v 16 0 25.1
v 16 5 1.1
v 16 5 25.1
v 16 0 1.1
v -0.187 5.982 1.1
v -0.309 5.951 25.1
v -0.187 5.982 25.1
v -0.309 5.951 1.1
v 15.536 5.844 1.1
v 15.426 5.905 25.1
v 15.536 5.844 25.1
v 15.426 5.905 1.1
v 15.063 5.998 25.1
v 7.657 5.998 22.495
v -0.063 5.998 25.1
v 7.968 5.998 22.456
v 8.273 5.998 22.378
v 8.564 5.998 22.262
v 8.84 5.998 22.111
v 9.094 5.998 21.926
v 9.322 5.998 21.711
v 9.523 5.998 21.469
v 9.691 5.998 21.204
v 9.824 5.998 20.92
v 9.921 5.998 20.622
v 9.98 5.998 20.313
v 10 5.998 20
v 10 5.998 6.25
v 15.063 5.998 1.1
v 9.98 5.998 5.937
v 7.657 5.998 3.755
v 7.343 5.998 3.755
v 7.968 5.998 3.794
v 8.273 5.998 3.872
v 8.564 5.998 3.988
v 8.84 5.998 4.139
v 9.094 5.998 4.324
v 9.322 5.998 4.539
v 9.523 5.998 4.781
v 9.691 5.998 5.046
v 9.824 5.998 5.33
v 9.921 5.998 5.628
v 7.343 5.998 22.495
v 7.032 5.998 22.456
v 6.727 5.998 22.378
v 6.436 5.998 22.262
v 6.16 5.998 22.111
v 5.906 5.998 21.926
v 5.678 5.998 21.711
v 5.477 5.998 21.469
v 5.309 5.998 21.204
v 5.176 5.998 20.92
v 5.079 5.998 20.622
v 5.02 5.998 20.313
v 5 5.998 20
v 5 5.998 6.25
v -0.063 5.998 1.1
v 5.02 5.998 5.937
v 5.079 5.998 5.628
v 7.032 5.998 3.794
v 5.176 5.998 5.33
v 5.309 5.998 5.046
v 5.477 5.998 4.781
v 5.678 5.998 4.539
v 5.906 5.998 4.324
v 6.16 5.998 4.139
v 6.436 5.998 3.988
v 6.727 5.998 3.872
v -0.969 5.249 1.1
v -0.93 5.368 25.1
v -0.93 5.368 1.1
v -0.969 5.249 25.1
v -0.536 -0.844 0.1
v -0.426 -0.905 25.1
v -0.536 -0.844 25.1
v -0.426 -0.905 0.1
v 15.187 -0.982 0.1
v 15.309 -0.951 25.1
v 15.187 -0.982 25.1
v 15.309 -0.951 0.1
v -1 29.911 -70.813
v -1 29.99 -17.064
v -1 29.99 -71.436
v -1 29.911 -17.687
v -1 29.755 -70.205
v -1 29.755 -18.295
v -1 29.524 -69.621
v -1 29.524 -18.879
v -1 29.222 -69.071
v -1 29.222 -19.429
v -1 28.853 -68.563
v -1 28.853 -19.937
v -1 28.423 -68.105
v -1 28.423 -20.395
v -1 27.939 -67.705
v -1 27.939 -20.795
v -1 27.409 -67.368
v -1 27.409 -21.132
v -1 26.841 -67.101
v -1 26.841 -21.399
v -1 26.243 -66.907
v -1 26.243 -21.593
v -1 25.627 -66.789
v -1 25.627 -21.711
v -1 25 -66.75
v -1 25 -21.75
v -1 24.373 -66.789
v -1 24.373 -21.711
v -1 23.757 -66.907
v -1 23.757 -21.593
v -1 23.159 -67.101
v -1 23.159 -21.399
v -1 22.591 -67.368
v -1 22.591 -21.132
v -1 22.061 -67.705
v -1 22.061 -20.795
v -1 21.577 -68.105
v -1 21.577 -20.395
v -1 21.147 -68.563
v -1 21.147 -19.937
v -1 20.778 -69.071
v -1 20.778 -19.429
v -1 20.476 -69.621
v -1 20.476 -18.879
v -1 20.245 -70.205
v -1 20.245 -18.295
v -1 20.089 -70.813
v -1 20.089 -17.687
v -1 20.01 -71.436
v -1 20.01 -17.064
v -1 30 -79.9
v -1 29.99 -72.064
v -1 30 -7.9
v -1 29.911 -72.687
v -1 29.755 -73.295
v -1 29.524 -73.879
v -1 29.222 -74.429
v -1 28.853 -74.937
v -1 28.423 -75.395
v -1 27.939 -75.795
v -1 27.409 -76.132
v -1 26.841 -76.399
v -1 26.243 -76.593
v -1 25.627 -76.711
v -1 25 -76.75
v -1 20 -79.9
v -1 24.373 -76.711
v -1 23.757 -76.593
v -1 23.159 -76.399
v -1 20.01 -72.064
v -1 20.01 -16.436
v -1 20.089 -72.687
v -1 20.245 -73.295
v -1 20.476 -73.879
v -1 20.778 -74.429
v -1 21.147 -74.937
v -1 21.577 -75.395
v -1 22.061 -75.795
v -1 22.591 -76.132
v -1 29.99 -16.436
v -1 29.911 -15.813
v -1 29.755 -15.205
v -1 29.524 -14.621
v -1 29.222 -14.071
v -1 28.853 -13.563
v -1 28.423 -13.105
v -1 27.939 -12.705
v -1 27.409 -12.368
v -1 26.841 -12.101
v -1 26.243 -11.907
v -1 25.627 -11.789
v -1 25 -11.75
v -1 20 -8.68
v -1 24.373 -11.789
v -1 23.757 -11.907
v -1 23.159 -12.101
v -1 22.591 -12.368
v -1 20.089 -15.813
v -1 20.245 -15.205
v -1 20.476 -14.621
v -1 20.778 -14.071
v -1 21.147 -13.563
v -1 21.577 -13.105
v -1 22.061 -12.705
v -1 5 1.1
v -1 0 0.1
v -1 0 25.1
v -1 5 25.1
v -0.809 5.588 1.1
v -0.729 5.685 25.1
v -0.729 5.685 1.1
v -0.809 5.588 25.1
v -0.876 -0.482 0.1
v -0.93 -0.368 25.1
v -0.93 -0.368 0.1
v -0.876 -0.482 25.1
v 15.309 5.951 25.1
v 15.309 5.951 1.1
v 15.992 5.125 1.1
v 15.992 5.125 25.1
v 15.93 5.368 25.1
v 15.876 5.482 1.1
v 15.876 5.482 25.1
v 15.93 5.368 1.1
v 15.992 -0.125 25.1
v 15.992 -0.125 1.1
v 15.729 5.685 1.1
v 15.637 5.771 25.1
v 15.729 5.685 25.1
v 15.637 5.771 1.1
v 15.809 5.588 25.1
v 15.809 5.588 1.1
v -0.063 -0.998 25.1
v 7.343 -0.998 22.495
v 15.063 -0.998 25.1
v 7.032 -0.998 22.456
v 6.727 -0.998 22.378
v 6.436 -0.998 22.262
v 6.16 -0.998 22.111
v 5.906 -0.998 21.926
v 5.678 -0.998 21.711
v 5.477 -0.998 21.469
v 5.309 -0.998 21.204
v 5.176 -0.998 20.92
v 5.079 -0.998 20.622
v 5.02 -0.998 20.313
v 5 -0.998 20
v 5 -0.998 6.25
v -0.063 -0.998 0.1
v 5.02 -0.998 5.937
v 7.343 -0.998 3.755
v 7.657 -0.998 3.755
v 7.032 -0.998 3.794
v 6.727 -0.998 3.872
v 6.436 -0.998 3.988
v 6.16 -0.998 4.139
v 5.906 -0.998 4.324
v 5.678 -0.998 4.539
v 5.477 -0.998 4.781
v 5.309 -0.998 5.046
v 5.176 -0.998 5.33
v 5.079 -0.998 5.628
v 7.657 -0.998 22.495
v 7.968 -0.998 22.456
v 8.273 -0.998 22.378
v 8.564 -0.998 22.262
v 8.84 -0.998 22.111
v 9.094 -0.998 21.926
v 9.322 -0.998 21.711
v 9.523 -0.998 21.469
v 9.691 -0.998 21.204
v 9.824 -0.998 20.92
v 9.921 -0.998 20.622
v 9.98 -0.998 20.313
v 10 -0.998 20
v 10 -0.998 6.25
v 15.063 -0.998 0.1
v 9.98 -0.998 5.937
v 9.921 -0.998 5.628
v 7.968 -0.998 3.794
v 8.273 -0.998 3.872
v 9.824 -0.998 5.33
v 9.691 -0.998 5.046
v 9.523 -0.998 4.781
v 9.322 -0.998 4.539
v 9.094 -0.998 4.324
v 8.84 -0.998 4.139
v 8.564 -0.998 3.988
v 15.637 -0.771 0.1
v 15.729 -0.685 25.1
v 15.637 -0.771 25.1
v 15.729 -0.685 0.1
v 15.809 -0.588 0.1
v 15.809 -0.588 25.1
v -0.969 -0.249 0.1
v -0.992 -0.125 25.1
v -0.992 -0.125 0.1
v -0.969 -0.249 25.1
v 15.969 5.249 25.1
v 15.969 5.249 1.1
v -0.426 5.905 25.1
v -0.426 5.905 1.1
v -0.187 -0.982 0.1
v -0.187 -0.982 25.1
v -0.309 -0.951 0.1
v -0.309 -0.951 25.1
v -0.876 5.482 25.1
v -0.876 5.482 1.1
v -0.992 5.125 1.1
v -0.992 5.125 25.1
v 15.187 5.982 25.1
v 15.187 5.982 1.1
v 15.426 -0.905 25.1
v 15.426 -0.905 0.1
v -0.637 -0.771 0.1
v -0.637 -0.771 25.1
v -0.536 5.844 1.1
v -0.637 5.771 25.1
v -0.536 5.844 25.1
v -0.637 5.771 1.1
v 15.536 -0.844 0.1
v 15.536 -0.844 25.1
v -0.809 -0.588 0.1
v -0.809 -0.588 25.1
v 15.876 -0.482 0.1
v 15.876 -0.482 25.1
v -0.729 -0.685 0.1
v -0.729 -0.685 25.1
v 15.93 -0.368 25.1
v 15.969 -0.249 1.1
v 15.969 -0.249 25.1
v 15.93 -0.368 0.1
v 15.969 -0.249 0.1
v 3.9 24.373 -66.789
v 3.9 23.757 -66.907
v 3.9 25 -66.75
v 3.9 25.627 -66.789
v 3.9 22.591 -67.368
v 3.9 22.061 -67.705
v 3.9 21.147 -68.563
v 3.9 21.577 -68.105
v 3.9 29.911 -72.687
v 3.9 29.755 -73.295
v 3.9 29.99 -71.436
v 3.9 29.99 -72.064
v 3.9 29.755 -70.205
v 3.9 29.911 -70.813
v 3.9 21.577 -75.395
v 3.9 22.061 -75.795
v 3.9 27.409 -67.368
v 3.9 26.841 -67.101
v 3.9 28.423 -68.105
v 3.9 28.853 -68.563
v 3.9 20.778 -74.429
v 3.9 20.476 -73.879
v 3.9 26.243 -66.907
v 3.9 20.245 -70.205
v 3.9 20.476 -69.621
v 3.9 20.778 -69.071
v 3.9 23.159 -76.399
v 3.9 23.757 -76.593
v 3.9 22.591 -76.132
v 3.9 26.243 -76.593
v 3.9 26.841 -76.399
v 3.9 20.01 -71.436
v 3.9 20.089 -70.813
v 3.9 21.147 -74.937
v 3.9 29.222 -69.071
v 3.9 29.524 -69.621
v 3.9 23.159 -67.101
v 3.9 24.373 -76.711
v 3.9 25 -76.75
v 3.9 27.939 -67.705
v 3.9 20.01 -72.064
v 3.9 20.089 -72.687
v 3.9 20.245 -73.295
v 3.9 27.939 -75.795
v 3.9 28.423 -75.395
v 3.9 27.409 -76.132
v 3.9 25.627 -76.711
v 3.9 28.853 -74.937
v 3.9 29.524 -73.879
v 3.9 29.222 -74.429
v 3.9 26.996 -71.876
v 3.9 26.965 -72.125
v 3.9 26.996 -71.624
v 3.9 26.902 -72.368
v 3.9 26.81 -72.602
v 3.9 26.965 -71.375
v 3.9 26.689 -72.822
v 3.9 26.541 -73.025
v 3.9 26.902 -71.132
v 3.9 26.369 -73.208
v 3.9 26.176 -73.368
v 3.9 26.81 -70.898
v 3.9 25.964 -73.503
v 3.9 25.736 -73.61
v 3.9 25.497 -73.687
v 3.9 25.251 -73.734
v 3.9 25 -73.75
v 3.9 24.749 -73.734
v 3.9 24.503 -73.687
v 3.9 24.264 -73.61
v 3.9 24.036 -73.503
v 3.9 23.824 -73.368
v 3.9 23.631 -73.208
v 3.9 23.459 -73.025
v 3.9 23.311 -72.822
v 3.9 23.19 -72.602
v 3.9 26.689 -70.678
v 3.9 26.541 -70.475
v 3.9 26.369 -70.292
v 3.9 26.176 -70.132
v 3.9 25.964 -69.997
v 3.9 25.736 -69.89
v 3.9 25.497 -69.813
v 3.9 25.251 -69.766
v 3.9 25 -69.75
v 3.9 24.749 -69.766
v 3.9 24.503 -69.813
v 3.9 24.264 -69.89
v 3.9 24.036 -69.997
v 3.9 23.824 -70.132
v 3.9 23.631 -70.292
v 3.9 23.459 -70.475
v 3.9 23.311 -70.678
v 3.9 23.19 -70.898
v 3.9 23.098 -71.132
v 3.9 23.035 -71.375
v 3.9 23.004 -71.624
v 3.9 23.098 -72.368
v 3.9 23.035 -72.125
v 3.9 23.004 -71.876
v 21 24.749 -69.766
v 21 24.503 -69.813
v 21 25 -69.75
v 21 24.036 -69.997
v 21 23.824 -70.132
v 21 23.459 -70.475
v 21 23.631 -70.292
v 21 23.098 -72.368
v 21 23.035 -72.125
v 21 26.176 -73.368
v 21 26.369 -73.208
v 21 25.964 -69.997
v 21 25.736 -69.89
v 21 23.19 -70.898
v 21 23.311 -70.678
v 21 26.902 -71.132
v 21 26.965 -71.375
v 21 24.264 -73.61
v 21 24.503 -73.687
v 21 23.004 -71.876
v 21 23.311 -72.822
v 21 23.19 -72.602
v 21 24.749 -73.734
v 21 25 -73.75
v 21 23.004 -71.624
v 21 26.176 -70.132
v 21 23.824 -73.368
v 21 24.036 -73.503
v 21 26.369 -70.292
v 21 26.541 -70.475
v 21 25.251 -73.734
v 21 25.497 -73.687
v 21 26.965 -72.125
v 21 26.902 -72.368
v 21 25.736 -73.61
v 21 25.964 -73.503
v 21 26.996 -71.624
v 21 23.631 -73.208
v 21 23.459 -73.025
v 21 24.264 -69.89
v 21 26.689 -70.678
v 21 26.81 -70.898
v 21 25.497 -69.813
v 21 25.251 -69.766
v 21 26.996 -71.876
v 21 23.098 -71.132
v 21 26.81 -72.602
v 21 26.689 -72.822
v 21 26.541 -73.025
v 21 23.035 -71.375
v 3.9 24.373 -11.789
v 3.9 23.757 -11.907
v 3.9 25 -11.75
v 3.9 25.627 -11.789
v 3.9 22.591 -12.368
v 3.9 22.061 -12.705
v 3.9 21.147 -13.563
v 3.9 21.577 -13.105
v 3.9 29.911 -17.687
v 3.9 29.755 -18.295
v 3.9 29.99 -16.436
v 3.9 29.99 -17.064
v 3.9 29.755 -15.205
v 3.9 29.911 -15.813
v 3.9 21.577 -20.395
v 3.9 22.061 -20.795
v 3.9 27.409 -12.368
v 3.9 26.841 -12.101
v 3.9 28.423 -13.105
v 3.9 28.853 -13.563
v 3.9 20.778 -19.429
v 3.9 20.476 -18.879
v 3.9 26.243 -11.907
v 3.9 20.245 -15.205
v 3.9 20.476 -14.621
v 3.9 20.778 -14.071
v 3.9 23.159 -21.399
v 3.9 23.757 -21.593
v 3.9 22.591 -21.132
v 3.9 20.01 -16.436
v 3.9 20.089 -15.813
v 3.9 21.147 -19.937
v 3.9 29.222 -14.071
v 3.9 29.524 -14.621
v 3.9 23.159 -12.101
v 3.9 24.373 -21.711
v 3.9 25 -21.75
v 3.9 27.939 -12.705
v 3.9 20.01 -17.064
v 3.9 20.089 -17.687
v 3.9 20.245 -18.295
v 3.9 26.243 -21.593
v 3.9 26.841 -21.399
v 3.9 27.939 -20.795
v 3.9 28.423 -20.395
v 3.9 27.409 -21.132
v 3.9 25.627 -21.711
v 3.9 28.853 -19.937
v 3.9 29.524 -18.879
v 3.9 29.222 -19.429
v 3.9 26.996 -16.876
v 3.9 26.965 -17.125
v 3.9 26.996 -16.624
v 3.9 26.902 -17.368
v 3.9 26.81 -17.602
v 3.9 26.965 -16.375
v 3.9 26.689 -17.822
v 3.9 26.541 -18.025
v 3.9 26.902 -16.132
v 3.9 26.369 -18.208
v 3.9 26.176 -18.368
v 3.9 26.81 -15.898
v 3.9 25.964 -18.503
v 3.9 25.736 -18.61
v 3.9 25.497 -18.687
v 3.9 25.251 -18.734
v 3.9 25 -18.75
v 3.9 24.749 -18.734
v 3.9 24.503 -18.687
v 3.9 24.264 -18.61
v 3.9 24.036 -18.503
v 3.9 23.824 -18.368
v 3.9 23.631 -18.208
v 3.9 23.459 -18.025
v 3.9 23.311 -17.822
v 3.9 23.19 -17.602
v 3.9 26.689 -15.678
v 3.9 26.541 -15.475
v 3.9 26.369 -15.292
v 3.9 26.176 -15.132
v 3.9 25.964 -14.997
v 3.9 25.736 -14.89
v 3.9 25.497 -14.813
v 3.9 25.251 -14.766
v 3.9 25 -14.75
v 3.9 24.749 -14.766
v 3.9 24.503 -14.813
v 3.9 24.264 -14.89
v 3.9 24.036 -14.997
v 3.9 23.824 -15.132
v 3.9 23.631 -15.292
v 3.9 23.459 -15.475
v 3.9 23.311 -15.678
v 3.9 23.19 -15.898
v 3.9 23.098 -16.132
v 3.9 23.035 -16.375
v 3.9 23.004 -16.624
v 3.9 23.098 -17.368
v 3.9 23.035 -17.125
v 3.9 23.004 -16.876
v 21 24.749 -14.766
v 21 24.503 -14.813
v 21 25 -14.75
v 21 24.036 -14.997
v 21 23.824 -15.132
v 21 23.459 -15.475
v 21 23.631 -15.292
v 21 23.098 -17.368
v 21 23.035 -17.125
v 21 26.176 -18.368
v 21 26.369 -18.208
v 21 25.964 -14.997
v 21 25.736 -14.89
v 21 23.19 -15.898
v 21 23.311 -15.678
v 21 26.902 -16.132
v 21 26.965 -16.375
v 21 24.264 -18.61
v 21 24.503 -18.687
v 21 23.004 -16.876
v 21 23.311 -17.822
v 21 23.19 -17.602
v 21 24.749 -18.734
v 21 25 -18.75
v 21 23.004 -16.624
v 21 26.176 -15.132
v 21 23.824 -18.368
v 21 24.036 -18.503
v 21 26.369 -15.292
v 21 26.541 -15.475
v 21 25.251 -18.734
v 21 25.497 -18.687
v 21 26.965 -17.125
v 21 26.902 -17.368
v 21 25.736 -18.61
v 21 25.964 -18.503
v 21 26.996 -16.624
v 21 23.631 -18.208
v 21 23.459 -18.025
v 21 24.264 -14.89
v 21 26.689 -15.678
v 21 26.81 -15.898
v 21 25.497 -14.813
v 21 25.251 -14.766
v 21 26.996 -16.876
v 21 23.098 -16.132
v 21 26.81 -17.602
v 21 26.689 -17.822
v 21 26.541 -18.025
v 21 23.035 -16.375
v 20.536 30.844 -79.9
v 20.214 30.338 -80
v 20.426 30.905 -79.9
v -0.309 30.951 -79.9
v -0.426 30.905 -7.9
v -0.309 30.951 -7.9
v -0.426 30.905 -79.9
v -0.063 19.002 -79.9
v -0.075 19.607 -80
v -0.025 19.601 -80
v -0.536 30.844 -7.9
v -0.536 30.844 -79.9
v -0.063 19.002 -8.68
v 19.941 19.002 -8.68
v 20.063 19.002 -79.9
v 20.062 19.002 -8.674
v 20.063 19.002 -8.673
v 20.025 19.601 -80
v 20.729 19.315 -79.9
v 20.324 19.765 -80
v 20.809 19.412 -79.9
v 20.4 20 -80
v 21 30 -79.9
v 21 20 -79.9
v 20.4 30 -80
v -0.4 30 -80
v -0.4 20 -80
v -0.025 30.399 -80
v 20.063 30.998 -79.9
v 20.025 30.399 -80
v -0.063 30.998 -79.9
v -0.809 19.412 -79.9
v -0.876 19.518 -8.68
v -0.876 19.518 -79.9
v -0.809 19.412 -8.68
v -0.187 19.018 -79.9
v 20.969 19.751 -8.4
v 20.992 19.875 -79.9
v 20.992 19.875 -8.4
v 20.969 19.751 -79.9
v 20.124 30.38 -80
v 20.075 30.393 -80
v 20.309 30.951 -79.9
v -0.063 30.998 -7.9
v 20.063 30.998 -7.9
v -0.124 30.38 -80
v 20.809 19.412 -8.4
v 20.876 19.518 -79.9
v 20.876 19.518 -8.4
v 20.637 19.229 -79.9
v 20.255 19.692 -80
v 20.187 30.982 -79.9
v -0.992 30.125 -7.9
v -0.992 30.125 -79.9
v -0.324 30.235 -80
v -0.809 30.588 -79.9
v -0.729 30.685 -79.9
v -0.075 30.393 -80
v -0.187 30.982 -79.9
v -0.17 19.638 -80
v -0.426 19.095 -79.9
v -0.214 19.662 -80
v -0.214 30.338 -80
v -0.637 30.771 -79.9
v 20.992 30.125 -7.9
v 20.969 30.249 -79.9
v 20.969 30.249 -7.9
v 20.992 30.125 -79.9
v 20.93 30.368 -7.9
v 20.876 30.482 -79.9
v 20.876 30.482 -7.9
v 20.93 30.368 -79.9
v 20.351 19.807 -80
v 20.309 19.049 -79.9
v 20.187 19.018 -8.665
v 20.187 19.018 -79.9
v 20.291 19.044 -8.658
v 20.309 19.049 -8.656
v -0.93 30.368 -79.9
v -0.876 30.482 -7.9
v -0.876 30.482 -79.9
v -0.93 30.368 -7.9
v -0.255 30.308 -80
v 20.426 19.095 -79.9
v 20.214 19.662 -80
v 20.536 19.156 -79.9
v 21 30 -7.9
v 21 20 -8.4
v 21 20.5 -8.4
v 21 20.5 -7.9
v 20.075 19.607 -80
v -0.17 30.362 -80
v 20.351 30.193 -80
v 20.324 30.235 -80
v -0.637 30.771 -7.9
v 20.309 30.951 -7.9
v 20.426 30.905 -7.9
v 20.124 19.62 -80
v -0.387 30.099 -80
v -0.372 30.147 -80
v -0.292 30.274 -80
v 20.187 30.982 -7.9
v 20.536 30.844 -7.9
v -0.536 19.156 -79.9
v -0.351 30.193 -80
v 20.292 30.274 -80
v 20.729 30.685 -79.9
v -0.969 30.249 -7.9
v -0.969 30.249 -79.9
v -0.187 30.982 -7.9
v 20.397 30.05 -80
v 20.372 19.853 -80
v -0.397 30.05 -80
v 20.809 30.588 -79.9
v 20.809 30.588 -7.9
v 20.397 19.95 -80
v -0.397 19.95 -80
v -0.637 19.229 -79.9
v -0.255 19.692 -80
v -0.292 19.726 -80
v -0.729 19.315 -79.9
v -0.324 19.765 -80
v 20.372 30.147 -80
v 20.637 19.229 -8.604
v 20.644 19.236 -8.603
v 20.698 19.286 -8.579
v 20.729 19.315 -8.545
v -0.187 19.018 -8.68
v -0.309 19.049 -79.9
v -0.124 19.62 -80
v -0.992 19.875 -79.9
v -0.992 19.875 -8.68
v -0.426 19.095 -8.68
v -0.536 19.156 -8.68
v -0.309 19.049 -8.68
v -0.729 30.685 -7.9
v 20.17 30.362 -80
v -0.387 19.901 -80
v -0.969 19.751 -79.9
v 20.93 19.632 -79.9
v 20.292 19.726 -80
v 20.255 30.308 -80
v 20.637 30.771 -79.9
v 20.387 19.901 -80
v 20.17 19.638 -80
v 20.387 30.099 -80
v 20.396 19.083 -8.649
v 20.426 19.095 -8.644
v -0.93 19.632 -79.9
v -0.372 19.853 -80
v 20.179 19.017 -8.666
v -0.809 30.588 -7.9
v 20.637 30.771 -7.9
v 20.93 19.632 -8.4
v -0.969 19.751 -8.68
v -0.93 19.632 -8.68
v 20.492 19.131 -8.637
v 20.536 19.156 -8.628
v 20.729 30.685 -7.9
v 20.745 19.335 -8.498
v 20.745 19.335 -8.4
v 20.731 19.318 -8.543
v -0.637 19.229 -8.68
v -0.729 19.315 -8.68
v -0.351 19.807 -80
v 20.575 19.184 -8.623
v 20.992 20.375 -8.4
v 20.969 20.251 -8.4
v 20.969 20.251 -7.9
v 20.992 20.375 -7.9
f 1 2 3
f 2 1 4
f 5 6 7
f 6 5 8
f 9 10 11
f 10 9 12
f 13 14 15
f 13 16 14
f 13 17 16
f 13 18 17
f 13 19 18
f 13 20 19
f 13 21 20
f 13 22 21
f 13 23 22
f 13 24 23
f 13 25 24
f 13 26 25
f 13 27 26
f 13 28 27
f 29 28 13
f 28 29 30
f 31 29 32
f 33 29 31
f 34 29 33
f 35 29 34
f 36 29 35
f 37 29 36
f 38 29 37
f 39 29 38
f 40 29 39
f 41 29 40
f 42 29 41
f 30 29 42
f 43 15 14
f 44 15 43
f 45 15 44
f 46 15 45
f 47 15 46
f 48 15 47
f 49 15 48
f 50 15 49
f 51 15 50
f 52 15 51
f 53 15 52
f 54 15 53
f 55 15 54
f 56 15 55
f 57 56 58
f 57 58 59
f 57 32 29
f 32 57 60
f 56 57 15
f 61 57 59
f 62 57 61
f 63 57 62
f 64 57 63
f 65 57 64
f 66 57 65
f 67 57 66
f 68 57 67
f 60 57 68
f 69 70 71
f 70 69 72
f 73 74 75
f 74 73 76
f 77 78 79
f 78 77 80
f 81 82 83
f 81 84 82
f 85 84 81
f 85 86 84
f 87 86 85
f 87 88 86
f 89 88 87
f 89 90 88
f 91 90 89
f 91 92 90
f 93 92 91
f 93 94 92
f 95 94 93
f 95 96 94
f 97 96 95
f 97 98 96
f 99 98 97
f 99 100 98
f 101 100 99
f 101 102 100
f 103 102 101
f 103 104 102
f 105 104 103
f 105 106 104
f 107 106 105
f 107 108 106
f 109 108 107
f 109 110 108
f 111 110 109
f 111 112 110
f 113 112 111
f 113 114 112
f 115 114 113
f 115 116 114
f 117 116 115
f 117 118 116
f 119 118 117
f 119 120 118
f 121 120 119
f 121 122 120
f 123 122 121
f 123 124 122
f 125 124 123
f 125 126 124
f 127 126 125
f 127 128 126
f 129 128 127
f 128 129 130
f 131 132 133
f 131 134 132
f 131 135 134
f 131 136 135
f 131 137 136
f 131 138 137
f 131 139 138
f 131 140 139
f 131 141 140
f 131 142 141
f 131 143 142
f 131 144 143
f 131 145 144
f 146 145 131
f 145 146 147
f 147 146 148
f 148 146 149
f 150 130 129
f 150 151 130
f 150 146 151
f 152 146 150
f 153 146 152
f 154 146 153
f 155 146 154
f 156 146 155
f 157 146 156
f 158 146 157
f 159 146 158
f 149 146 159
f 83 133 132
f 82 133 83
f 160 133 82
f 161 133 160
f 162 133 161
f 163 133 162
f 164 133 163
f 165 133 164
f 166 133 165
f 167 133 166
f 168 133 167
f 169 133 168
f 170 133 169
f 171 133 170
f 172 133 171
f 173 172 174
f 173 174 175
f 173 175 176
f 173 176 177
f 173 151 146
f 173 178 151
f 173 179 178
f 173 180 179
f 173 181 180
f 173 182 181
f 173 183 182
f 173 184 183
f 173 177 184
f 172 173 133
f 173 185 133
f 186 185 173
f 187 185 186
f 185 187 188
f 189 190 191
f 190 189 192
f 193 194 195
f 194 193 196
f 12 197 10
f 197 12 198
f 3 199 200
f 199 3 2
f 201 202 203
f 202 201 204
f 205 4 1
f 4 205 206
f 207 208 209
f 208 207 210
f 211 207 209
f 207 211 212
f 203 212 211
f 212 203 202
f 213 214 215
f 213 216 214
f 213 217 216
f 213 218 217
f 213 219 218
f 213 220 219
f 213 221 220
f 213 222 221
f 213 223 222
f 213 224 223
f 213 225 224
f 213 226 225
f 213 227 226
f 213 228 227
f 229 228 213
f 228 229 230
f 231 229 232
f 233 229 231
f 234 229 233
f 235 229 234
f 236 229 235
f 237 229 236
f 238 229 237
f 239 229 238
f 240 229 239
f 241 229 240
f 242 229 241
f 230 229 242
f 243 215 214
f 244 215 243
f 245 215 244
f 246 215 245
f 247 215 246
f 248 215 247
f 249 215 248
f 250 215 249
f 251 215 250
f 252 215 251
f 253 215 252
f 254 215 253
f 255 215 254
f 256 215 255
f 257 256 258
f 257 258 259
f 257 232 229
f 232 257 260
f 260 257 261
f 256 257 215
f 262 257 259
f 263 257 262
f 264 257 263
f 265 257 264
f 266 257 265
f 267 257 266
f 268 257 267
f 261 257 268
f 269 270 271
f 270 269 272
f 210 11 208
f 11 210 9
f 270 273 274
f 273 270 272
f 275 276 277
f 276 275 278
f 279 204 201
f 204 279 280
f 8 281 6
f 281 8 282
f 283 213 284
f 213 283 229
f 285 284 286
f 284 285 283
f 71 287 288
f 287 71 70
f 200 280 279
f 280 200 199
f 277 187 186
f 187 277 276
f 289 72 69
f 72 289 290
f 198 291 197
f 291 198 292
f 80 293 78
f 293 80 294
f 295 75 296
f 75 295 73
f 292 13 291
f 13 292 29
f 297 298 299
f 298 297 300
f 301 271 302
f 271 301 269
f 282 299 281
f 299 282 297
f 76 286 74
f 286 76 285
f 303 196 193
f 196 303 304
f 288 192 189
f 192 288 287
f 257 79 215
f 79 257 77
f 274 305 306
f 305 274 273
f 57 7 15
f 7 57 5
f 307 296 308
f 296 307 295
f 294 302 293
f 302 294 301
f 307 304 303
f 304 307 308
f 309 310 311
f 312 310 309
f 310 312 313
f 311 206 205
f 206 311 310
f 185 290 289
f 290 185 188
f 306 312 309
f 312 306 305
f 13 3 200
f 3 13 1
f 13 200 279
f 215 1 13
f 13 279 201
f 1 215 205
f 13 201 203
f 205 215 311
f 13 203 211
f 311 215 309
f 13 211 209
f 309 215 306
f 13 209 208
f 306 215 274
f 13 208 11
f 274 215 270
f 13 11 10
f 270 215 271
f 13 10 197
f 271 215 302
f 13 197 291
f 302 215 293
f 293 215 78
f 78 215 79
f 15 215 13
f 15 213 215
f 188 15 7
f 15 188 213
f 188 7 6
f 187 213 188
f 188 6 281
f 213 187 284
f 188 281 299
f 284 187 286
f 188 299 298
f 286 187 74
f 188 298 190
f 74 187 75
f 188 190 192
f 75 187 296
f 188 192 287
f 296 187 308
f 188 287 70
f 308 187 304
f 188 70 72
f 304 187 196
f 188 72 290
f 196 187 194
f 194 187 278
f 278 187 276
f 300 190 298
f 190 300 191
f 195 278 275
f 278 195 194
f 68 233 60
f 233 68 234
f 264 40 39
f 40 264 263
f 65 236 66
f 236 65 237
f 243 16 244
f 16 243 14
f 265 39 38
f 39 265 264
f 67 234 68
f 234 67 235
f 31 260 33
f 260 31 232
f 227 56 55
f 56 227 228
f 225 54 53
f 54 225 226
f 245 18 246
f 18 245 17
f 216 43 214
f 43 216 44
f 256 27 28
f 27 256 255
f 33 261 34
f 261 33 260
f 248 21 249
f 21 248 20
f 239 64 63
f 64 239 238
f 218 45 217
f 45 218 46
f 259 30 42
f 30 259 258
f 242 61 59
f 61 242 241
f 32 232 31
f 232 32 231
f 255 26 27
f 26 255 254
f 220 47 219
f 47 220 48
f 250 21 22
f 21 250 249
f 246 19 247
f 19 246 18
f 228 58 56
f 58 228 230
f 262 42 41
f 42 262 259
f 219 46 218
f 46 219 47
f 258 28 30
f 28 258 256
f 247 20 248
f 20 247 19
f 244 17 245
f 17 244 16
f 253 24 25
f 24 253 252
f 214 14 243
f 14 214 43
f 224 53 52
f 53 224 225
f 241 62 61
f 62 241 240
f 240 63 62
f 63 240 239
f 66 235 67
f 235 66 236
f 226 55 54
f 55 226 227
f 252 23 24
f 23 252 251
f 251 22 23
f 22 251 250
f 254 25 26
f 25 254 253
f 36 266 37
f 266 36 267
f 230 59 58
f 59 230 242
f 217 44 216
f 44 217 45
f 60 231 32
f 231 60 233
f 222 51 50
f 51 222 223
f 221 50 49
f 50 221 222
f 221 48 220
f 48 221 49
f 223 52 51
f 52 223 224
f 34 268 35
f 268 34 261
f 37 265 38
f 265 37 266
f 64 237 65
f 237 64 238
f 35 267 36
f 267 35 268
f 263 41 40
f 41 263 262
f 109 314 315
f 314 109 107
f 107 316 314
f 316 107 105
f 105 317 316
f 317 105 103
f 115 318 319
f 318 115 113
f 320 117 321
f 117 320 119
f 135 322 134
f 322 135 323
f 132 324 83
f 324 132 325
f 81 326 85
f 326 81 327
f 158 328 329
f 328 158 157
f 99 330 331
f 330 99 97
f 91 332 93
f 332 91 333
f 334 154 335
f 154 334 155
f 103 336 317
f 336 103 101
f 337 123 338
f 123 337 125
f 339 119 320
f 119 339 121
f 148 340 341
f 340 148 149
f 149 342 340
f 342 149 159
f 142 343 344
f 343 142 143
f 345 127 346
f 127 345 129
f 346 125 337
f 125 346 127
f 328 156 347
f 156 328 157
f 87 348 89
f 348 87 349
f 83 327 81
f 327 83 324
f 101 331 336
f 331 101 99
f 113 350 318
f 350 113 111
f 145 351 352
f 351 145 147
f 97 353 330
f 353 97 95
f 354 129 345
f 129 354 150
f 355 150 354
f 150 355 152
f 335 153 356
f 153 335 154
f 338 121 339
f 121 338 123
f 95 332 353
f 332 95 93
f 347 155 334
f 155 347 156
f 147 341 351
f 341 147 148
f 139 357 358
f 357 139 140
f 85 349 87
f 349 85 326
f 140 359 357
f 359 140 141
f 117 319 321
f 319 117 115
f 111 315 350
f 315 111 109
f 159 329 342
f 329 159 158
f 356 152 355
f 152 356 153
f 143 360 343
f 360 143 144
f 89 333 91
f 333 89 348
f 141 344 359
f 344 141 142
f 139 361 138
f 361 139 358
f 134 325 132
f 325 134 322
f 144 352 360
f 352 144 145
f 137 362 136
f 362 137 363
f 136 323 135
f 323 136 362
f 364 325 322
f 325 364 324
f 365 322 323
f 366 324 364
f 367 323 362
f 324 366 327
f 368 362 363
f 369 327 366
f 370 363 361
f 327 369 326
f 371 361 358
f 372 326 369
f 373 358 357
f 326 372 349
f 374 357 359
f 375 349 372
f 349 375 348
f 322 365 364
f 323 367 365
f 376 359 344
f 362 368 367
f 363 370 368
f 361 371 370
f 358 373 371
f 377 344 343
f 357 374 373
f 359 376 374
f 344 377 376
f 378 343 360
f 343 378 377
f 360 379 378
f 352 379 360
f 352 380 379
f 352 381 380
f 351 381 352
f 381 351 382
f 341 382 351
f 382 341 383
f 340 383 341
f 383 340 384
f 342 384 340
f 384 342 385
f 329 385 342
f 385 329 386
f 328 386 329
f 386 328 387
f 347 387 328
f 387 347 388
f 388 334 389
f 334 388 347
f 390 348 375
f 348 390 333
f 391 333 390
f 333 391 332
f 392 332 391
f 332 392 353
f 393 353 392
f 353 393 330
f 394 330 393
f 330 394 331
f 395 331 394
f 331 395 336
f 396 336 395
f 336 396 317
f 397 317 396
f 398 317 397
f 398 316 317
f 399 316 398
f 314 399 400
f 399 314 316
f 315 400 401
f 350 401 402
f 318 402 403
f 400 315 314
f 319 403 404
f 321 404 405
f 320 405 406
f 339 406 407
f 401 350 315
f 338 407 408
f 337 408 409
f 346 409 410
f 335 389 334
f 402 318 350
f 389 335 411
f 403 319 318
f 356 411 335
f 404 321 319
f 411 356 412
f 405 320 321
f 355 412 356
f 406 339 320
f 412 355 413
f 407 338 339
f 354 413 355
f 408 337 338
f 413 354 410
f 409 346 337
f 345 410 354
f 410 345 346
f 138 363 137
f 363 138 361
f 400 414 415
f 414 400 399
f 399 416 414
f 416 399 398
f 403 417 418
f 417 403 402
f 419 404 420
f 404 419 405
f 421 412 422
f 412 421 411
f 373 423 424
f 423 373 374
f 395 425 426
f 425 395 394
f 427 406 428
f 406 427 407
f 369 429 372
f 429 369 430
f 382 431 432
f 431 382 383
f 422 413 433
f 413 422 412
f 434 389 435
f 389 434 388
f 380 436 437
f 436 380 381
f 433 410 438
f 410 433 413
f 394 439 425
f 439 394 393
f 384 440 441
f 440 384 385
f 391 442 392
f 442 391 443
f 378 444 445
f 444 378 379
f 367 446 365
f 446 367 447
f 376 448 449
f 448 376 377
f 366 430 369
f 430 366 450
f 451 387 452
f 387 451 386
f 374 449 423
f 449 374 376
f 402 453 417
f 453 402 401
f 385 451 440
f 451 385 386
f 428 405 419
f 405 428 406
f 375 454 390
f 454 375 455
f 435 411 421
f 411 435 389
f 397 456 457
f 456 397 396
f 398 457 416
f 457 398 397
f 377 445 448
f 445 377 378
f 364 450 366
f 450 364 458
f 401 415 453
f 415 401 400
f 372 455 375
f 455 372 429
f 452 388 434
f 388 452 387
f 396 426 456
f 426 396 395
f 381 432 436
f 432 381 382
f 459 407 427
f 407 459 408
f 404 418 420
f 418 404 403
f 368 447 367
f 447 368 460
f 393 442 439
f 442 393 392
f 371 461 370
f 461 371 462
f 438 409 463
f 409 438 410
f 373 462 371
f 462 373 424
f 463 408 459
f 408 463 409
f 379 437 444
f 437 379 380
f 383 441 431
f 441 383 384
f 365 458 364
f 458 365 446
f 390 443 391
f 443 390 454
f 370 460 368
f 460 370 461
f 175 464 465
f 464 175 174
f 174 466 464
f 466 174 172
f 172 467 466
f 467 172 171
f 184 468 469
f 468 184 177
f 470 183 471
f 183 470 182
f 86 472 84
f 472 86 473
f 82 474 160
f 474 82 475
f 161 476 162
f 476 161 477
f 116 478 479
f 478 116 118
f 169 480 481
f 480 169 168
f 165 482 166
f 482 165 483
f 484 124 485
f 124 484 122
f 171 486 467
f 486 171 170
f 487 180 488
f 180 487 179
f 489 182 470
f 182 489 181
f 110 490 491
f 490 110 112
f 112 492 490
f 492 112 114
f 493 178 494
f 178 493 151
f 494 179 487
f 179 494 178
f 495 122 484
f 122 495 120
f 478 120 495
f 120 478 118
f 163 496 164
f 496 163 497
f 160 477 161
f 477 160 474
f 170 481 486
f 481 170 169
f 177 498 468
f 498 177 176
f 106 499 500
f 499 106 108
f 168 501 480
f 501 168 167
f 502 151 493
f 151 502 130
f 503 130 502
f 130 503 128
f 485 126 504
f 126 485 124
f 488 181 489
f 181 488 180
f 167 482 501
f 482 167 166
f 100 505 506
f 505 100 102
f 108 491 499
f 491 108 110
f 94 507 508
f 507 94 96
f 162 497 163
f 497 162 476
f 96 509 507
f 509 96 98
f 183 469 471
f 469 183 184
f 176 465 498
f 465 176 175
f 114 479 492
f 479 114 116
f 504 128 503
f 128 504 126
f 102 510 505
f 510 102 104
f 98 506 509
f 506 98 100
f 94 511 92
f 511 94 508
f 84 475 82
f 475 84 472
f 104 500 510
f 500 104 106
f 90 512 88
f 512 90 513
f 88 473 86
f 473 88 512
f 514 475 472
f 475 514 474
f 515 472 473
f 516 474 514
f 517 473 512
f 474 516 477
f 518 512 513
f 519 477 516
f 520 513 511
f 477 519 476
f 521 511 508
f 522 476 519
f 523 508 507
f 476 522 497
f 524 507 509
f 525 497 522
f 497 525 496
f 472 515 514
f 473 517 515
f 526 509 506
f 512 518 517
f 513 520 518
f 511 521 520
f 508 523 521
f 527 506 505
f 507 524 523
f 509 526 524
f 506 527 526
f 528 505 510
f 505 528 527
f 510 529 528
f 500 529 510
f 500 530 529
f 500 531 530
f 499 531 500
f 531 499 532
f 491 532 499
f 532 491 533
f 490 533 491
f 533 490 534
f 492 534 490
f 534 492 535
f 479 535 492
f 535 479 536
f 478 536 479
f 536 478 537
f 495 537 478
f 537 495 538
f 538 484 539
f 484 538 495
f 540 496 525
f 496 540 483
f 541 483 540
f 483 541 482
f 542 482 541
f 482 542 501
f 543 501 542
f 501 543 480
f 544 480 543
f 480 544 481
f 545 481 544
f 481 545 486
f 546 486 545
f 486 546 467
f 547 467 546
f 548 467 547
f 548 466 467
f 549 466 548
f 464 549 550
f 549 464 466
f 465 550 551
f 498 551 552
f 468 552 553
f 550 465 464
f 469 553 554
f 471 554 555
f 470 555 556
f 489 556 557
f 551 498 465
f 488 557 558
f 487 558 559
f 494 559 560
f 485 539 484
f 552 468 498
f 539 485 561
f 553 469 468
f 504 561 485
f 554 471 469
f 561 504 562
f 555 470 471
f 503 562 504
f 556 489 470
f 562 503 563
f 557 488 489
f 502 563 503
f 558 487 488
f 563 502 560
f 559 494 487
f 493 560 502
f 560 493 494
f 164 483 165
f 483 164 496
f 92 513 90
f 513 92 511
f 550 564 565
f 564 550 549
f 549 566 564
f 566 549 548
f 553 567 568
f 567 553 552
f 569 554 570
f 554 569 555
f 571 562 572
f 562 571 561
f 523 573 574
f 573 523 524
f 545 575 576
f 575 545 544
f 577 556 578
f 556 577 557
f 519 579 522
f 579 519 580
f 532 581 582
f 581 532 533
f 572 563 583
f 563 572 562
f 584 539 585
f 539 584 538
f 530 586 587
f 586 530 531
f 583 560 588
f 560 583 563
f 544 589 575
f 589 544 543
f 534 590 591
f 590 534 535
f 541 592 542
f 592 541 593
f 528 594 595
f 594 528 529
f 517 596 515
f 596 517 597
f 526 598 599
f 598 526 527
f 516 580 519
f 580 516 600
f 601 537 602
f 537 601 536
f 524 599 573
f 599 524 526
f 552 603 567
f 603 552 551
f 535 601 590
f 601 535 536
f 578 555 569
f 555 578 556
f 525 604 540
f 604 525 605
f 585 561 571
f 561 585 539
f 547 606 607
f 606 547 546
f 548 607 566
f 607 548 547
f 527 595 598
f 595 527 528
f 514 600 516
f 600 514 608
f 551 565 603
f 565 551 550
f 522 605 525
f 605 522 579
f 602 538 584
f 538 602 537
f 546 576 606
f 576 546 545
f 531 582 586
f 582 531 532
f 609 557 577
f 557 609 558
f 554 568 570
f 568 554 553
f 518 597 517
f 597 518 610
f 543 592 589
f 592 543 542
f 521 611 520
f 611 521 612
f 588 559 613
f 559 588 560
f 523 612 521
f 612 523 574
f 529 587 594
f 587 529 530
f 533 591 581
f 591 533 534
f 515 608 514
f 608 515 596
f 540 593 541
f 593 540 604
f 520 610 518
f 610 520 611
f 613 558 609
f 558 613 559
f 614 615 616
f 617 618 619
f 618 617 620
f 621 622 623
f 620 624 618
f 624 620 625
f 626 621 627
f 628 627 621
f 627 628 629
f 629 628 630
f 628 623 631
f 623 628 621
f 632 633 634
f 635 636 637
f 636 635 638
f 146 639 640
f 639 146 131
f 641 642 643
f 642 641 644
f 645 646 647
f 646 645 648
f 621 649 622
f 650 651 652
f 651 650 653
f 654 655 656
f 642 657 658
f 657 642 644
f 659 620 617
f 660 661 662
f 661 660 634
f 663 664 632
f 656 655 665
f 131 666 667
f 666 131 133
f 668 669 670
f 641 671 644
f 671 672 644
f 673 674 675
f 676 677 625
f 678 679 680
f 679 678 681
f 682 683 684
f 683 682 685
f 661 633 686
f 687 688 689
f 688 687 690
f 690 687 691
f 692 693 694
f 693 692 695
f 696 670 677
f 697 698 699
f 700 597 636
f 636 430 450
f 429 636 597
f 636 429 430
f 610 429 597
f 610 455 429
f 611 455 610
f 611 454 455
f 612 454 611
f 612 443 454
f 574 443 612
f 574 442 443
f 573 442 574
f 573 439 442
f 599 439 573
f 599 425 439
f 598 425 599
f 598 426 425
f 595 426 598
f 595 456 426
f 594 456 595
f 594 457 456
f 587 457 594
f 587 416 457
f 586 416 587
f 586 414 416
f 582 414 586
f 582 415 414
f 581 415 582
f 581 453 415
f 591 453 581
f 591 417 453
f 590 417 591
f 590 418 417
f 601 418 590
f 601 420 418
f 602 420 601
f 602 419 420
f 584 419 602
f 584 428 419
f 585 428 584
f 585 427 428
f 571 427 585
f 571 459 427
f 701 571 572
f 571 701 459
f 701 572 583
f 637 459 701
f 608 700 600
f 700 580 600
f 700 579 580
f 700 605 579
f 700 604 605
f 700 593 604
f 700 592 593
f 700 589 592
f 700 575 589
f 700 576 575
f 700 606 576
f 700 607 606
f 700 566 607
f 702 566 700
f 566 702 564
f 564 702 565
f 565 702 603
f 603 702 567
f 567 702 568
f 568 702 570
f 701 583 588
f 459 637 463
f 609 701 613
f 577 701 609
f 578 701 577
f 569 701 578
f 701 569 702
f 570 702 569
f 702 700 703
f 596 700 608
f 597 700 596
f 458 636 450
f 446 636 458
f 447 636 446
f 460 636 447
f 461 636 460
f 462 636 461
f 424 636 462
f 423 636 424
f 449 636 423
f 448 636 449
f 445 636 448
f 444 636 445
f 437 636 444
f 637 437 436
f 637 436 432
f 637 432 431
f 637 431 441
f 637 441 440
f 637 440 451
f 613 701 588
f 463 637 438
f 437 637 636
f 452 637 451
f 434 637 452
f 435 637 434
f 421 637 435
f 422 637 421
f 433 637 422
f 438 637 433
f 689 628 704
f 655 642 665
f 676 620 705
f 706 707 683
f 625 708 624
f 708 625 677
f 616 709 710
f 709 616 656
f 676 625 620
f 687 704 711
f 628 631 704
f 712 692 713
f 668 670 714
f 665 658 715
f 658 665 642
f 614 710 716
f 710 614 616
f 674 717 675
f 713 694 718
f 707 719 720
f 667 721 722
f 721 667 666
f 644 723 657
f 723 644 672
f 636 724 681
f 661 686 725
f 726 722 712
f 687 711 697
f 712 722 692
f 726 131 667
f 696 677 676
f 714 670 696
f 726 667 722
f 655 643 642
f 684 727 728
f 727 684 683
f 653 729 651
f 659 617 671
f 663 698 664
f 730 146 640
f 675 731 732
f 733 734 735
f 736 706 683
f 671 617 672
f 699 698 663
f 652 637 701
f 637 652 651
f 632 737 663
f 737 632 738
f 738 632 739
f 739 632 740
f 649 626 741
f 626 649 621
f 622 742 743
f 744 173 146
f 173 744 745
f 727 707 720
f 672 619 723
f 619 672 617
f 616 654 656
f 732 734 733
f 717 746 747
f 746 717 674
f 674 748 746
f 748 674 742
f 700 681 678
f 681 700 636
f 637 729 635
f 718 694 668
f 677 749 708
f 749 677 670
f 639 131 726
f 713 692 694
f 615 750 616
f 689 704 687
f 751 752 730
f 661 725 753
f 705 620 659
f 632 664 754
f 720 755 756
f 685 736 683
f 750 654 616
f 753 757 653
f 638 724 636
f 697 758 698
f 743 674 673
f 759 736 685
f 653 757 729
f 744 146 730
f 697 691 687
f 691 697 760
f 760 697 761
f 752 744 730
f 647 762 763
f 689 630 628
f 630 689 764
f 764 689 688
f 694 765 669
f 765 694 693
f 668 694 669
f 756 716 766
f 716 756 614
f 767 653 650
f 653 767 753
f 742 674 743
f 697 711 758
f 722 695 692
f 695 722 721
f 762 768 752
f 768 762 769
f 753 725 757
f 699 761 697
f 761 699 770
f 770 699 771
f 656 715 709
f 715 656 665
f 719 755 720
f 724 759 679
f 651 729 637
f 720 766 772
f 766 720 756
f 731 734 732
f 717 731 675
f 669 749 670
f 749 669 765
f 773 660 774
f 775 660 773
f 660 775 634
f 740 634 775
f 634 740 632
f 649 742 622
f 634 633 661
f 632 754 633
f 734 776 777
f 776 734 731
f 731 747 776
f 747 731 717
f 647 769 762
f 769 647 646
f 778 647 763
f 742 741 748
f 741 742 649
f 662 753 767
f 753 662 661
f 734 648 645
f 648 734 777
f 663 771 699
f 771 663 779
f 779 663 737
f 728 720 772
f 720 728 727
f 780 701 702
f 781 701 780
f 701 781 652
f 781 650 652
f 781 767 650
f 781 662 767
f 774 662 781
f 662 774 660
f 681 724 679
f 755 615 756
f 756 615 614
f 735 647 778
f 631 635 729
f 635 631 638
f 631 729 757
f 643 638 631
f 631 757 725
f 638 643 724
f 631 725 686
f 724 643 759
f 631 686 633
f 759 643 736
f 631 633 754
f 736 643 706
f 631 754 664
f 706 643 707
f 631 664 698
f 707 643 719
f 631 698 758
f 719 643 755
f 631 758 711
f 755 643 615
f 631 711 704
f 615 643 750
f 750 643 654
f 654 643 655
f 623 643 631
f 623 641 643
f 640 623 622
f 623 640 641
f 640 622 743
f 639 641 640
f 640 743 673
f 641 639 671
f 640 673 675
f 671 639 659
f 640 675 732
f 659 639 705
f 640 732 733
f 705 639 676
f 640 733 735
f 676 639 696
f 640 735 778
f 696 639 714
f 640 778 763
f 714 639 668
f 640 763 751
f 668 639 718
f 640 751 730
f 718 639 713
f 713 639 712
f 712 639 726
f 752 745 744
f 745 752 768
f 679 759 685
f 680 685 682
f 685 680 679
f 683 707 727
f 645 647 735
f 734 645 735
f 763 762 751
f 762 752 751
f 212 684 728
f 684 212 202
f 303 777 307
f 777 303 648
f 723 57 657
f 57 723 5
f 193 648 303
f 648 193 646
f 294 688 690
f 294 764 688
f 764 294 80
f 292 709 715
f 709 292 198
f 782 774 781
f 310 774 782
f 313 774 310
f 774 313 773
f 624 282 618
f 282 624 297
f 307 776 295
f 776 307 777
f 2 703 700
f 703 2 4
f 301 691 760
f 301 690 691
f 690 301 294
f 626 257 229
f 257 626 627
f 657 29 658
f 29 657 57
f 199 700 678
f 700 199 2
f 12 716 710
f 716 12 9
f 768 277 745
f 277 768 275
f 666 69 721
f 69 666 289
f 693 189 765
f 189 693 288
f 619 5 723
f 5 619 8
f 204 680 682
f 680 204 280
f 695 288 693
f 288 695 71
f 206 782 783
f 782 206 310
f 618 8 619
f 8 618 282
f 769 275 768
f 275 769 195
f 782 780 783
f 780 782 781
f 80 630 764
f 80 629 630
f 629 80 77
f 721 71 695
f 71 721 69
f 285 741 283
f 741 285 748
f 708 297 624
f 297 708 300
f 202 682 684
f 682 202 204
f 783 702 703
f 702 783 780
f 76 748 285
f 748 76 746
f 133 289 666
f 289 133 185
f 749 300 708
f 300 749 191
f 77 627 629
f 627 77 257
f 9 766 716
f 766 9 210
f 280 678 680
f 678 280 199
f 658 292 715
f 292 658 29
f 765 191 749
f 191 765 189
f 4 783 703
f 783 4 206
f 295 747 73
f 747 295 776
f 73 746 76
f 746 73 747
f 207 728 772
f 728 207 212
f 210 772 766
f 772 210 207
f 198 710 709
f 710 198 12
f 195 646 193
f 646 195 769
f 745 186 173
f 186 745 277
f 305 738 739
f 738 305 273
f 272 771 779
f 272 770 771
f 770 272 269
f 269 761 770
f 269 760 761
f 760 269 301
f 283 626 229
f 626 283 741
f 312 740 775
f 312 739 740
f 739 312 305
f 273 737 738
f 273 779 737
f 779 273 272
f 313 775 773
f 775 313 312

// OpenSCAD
// file: util.scad
module rounded_cube(c=[1,1,1], r=0.1, h=0.4) {
    minkowski(){
      cube(c);
      cylinder(r,h);
    }
}

module half_cylinder(h=1, r=1) {
 intersection() {
     translate([0, -r, 0]) cube([r*2,r*2,h]);
     cylinder(r=r, h=h);
 }   
}

module halfSphere(r=1) {
 intersection() {
     translate([0, -r, -r]) cube([r*2,r*2,r*2]);
     sphere(r=r);
 }   
}

module pin(h=1) {
    hull(){
        cylinder(h=0.1,r=h/2);
        translate([0,0,h]) sphere(r=0.1);
    }
}

module hollow_cylinder(h=1, r=1, shell=0.1) {
    s = 1 - shell;
    difference() {
        cylinder(h=h,r=r);
        translate([0,0,-0.5]) cylinder(h=h+1,r=r*s);
    }
}

module cube_minus_sphere(size=1) {
    difference() {
       translate([-size/2,0.1,-size/2]) cube([size,size/2,size]);
       rotate([0,0,90]) halfSphere(r=size/2);
    }
}

module curve_cube(c=[1,1,1], curve=0.5) {
    difference() {
        rounded_cube(c);
        scale([1, 1, curve]) 
            translate([-1.5,c[1]/2,-c[1]/8]) 
                rotate([0,90,0]) 
                    cylinder(h=c[0]+3,r=c[1]/1.8);
    }    
}
module hook(h=5, d=3) {
    $fn=100;
    cylinder(h,d=d);
    translate([0,0,h]) sphere(d=d);
    
}

module cone(startDia=5, endDia=1, h=5) {
    $fn=200;
    hull() {
        cylinder(h=0.1, d=startDia);
        translate([0,0,endDia]) cylinder(h, d=endDia);
    }
}


module flexScrewHole(screwLength=10, screwDia=5, stretch=10, center=true ) {
    centerX = center ? -stretch/2 : 0;
    translate([centerX,0,0]){
        hull() {
            cylinder(h=screwLength, d=screwDia);
            translate([stretch,0,0]) cylinder(h=screwLength, d=screwDia);
        }
    }
}

module nut() {
    $fn=6;
    cylinder(d=TC_SCREW_NUT_DIA, h=TC_SCREW_NUT_HEIGHT);   
}

module hollow_rounded_cube(c=[1,1,1], shell=2.5, center=true) {
    //center
    centerX = center ? -c[0]/2 : 0;
    centerY = center ? -c[1]/2 : 0;
    translate([centerX,centerY, 0]) {
    
    difference() { 
        rounded_cube(c,0.1, 0.4);
        //inner
        translate([shell/2,shell/2,-.1]) {
            rounded_cube([c[0]-shell,c[1]-shell,c[2]+1],0.1, 0.4);
        }
    }
}
}

module triangle(size=100, height=10) {
 linear_extrude(height=height) polygon(points=[[0,0],[size,0],[0,size]], paths=[[0,1,2]]);
}
// file: startup.scad
include <util.scad>;

$fn =50;

//Aluminuim profile 3030
ALUMINUM_SIZE=30;

// carraige mount
CARRAGE_MOUNT_X=35;
CARRAGE_MOUNT_Y=65;
CARRAGE_MOUNT_Z=7;
TOOL_CHANGER_Z=7;

//size
CMS =
[CARRAGE_MOUNT_X,
CARRAGE_MOUNT_Y,
CARRAGE_MOUNT_Z];

// tool changer
toolChangerSize = 
[CARRAGE_MOUNT_X,
CARRAGE_MOUNT_Y,
TOOL_CHANGER_Z];

// tool catcher
TC_BASE_X=ALUMINUM_SIZE;
TC_BASE_Y=5;
TC_BASE_Z=20;
TC_BASE=[TC_BASE_X,TC_BASE_Y,TC_BASE_Z];


//locking in location small rods
RODS_HEIGHT=9;   // real heigt is 12
RODS_DIA=3.5;
RODS_FROM_X_FRONT=6;
RODS_FROM_Y_FRONT=20;
RODS_DISTANCE_FRONT=24;

// HOOKS
HOOKS_HEIGT=6;
HOOKS_DIA=6;

//magnets
MAGNET_DIA=12.5;
MAGNET_HEIGHT=5.5;
MAGNET_DISTANCE=30;

//new magnets
MAGNET_NEW_DIA=20;
MAGNET_NEW_HEIGHT=6;

//Brass Knurl screw
BRASS_KNURL_SCREW_DIA=5;
BRASS_KNURL_SCREW_HEIGHT=5;

//V6 HOT END
v6_DIA=16;
v6_DIA_HEIGHT_DOWN=3;
v6_DIA_HEIGHT_UP=3.7;
v6_INNER_DIA=12;
v6_INNER_HEIGHT=6;

v6_MOUNT_HEIGHT=v6_DIA_HEIGHT_DOWN + v6_INNER_HEIGHT + v6_DIA_HEIGHT_UP - .2;
v6_MOUNT_WIDTH=20;

v6_SECOND_PART_WIDTH=11;

//tool change
TC_SCREW_DISTANCE = 55;
TC_SCREW_LENGTH = 25;
TC_SCREW_HEAD_HEIGHT = 5;
TC_SCREW_HEAD_DIA = 10;
TC_SCREW_DIA = 4;

//nut 
TC_SCREW_NUT_DIA = 8;
TC_SCREW_NUT_HEIGHT = 4;


//tool catcher
TOOL_CATHCER_SCREWS_DISTANCE = ALUMINUM_SIZE/2;

//plastic tie 
PLASTIC_TIE_HEIGHT = 2.2;
PLASTIC_TIE_DEPTH = 3;

//fan mount
FAN_MOUNT_DISTANCE=20;
FAN_MOUNT_TUBE_DIA=5;


module toolChangeScrew() {
//top
cylinder (h=TC_SCREW_HEAD_HEIGHT, d=TC_SCREW_HEAD_DIA);
//body
translate([0,0,TC_SCREW_HEAD_HEIGHT -.1])
cylinder (h=TC_SCREW_LENGTH, d=TC_SCREW_DIA);    
}

module toolChangeScrews(right=true, center=true) {
    r = right ? 180 : 0;
    c = center ? -TC_SCREW_DISTANCE/2 : 0;
    translate([c,0,0]) {
        rotate([r,0,0]) {
            toolChangeScrew();
            translate([TC_SCREW_DISTANCE,0,0])
                toolChangeScrew();
        }
  }
}

module toolChangeScrewsWithNut(right=true, center=true) {
    toolChangeScrews(right, center);
    c = center ? -TC_SCREW_DISTANCE/2 : 0;
    r = right ? -TC_SCREW_LENGTH : TC_SCREW_LENGTH;
    translate([c,0,0]) {
      translate([0,0, r]) nut();
      translate([TC_SCREW_DISTANCE,0,r]) nut();
    }
    
    
}

module M3Screw(length=10) {
    //top
    cylinder (h=3, d=5.5);
    //body
    translate([0,0,3 -.1])
    cylinder (h=length, d=3);
}

module M5Screw(length=10) {
    //top
    cylinder (h=5, d=9);
    //body
    translate([0,0,5 -.1])
    cylinder (h=length, d=5);
}

module brassKnurlScrew() {
    cylinder (h=BRASS_KNURL_SCREW_HEIGHT, d=BRASS_KNURL_SCREW_DIA);
}


module magnet(h=MAGNET_HEIGHT, d=MAGNET_DIA) {
    cylinder (h=MAGNET_HEIGHT, d=MAGNET_DIA);
}

module small_rods_relative(distanceBetweenRodsX=10, distanceBetweenRodsY=10 ,centerRode=true) {
    //up right
    cylinder(h=RODS_HEIGHT, d=RODS_DIA);
    //up left
    translate([distanceBetweenRodsX,0,0])
      cylinder(h=RODS_HEIGHT, d=RODS_DIA);
    //down right
    translate([0,distanceBetweenRodsY,0])
      cylinder(h=RODS_HEIGHT, d=RODS_DIA);
    //down left
    translate([distanceBetweenRodsX,distanceBetweenRodsY,0])
      cylinder(h=RODS_HEIGHT, d=RODS_DIA);
    if(centerRode){
    //center
    translate([distanceBetweenRodsX/2,distanceBetweenRodsY/2,0])
      cylinder(h=RODS_HEIGHT, d=RODS_DIA);
    }
}

module small_hooks_relative(distanceBetweenHooksX=10, distanceBetweenHooksY=10, hooksScale=1) {
    //up right
    scale(hooksScale) hook(h=HOOKS_HEIGT, d=HOOKS_DIA);
    //up left
    translate([distanceBetweenHooksX,0,0])
      scale(hooksScale) hook(h=HOOKS_HEIGT, d=HOOKS_DIA);
    //down right
    translate([0,distanceBetweenHooksY,0])
      scale(hooksScale) hook(h=HOOKS_HEIGT, d=HOOKS_DIA);
    //down left
    translate([distanceBetweenHooksX,distanceBetweenHooksY,0])
      scale(hooksScale) hook(h=HOOKS_HEIGT, d=HOOKS_DIA);
}

module magnetsRelative(distanceBetweenMagnet=15, center=true) {
    
    c = center ? 0 : -distanceBetweenMagnet/2 ;
    translate([c, 0,0 ]){
    
      //up center
      translate ([distanceBetweenMagnet/2, 0,0]) magnet();    
      //translate ([distanceBetweenMagnetX, distanceBetweenMagnetY,0])
       // magnet();
      translate ([-distanceBetweenMagnet/2, 0,0])
        magnet();
    }
}


module tieHole(tieSize=3, depth=10) {
   rotate_extrude(angle=180, $fn=100)
       translate([depth, 0]) circle(tieSize);   
}

module M3nut() {
    $fn=6;
    cylinder(d=6, h=3);
}

module newMagnet() {
    $fn=400;
    cylinder(h=MAGNET_NEW_HEIGHT, d=MAGNET_NEW_DIA);
}

module toolChangerScrewGate() {
    cone(TC_SCREW_DIA+1.5, TC_SCREW_DIA, 2);
}
// main file
include <startup.scad>;
include <util.scad>;

X = TC_SCREW_HEAD_DIA*2;
Y = TC_SCREW_HEAD_HEIGHT*2;
Z = TC_SCREW_DISTANCE*1.3;


TC_BASE2_X = 15;
TC_BASE2_Y = 5;
TC_BASE2_Z = 25;
TC_BASE2=[TC_BASE2_X,TC_BASE2_Y,TC_BASE2_Z];
module base(){
    rounded_cube(TC_BASE2,0.1, 0.4);
}

module M5screwsHolderLocation(center=true) {
    centerX = -TC_BASE2_X/2;
    centerY = -TC_BASE2_Y/2 + TC_BASE_Y/2 ;
    screwLength = TC_BASE_Y+3;
    translate([centerX,centerY,0])  {
        hull() {
            translate([0,0,(TC_BASE2_Z/2)*0.8]) 
                rotate([90,0,0]) cylinder(h=screwLength, d=5);
            translate([0,0,-(TC_BASE2_Z/2)*0.3])
                rotate([90,0,0]) cylinder(h=screwLength,d=5);
        }
    }
}


module catcherScrews(right=false) {
    translateScrewStartX = right ? -1.1 : X+1.1;
    difference() {
        rounded_cube([X,Y,Z],0.1, 0.4);
        translate([translateScrewStartX ,Y/2,Z/2]) {
            rotate([0,-90,0]) toolChangeScrews(right);
        }
    }


}

module toolChangerCathcer2(right=false) {
    difference() {
        base(); 
        translate([TC_BASE_X/2,TC_BASE_Y+1+.1,TC_BASE_Z/2]) M5screwsHolderLocation();

    }
    //todo chnage this to something else
    hull() {
   rounded_cube([15,TC_BASE_Y,1],0.1, 0.4);
   translate([0,20,-10]) translate([0,.5,1]) { 
       rounded_cube([X,Y-.5,1],0.1, 0.4);
    }
    }
    
   translate([0,20,-80]) translate([0,0,0]) { 
       catcherScrews(right);
       }
}
//linear_extrude(height = 0.6) projection(cut=false)
//rotate([0,-90,0]) 
toolChangerCathcer2(true);
